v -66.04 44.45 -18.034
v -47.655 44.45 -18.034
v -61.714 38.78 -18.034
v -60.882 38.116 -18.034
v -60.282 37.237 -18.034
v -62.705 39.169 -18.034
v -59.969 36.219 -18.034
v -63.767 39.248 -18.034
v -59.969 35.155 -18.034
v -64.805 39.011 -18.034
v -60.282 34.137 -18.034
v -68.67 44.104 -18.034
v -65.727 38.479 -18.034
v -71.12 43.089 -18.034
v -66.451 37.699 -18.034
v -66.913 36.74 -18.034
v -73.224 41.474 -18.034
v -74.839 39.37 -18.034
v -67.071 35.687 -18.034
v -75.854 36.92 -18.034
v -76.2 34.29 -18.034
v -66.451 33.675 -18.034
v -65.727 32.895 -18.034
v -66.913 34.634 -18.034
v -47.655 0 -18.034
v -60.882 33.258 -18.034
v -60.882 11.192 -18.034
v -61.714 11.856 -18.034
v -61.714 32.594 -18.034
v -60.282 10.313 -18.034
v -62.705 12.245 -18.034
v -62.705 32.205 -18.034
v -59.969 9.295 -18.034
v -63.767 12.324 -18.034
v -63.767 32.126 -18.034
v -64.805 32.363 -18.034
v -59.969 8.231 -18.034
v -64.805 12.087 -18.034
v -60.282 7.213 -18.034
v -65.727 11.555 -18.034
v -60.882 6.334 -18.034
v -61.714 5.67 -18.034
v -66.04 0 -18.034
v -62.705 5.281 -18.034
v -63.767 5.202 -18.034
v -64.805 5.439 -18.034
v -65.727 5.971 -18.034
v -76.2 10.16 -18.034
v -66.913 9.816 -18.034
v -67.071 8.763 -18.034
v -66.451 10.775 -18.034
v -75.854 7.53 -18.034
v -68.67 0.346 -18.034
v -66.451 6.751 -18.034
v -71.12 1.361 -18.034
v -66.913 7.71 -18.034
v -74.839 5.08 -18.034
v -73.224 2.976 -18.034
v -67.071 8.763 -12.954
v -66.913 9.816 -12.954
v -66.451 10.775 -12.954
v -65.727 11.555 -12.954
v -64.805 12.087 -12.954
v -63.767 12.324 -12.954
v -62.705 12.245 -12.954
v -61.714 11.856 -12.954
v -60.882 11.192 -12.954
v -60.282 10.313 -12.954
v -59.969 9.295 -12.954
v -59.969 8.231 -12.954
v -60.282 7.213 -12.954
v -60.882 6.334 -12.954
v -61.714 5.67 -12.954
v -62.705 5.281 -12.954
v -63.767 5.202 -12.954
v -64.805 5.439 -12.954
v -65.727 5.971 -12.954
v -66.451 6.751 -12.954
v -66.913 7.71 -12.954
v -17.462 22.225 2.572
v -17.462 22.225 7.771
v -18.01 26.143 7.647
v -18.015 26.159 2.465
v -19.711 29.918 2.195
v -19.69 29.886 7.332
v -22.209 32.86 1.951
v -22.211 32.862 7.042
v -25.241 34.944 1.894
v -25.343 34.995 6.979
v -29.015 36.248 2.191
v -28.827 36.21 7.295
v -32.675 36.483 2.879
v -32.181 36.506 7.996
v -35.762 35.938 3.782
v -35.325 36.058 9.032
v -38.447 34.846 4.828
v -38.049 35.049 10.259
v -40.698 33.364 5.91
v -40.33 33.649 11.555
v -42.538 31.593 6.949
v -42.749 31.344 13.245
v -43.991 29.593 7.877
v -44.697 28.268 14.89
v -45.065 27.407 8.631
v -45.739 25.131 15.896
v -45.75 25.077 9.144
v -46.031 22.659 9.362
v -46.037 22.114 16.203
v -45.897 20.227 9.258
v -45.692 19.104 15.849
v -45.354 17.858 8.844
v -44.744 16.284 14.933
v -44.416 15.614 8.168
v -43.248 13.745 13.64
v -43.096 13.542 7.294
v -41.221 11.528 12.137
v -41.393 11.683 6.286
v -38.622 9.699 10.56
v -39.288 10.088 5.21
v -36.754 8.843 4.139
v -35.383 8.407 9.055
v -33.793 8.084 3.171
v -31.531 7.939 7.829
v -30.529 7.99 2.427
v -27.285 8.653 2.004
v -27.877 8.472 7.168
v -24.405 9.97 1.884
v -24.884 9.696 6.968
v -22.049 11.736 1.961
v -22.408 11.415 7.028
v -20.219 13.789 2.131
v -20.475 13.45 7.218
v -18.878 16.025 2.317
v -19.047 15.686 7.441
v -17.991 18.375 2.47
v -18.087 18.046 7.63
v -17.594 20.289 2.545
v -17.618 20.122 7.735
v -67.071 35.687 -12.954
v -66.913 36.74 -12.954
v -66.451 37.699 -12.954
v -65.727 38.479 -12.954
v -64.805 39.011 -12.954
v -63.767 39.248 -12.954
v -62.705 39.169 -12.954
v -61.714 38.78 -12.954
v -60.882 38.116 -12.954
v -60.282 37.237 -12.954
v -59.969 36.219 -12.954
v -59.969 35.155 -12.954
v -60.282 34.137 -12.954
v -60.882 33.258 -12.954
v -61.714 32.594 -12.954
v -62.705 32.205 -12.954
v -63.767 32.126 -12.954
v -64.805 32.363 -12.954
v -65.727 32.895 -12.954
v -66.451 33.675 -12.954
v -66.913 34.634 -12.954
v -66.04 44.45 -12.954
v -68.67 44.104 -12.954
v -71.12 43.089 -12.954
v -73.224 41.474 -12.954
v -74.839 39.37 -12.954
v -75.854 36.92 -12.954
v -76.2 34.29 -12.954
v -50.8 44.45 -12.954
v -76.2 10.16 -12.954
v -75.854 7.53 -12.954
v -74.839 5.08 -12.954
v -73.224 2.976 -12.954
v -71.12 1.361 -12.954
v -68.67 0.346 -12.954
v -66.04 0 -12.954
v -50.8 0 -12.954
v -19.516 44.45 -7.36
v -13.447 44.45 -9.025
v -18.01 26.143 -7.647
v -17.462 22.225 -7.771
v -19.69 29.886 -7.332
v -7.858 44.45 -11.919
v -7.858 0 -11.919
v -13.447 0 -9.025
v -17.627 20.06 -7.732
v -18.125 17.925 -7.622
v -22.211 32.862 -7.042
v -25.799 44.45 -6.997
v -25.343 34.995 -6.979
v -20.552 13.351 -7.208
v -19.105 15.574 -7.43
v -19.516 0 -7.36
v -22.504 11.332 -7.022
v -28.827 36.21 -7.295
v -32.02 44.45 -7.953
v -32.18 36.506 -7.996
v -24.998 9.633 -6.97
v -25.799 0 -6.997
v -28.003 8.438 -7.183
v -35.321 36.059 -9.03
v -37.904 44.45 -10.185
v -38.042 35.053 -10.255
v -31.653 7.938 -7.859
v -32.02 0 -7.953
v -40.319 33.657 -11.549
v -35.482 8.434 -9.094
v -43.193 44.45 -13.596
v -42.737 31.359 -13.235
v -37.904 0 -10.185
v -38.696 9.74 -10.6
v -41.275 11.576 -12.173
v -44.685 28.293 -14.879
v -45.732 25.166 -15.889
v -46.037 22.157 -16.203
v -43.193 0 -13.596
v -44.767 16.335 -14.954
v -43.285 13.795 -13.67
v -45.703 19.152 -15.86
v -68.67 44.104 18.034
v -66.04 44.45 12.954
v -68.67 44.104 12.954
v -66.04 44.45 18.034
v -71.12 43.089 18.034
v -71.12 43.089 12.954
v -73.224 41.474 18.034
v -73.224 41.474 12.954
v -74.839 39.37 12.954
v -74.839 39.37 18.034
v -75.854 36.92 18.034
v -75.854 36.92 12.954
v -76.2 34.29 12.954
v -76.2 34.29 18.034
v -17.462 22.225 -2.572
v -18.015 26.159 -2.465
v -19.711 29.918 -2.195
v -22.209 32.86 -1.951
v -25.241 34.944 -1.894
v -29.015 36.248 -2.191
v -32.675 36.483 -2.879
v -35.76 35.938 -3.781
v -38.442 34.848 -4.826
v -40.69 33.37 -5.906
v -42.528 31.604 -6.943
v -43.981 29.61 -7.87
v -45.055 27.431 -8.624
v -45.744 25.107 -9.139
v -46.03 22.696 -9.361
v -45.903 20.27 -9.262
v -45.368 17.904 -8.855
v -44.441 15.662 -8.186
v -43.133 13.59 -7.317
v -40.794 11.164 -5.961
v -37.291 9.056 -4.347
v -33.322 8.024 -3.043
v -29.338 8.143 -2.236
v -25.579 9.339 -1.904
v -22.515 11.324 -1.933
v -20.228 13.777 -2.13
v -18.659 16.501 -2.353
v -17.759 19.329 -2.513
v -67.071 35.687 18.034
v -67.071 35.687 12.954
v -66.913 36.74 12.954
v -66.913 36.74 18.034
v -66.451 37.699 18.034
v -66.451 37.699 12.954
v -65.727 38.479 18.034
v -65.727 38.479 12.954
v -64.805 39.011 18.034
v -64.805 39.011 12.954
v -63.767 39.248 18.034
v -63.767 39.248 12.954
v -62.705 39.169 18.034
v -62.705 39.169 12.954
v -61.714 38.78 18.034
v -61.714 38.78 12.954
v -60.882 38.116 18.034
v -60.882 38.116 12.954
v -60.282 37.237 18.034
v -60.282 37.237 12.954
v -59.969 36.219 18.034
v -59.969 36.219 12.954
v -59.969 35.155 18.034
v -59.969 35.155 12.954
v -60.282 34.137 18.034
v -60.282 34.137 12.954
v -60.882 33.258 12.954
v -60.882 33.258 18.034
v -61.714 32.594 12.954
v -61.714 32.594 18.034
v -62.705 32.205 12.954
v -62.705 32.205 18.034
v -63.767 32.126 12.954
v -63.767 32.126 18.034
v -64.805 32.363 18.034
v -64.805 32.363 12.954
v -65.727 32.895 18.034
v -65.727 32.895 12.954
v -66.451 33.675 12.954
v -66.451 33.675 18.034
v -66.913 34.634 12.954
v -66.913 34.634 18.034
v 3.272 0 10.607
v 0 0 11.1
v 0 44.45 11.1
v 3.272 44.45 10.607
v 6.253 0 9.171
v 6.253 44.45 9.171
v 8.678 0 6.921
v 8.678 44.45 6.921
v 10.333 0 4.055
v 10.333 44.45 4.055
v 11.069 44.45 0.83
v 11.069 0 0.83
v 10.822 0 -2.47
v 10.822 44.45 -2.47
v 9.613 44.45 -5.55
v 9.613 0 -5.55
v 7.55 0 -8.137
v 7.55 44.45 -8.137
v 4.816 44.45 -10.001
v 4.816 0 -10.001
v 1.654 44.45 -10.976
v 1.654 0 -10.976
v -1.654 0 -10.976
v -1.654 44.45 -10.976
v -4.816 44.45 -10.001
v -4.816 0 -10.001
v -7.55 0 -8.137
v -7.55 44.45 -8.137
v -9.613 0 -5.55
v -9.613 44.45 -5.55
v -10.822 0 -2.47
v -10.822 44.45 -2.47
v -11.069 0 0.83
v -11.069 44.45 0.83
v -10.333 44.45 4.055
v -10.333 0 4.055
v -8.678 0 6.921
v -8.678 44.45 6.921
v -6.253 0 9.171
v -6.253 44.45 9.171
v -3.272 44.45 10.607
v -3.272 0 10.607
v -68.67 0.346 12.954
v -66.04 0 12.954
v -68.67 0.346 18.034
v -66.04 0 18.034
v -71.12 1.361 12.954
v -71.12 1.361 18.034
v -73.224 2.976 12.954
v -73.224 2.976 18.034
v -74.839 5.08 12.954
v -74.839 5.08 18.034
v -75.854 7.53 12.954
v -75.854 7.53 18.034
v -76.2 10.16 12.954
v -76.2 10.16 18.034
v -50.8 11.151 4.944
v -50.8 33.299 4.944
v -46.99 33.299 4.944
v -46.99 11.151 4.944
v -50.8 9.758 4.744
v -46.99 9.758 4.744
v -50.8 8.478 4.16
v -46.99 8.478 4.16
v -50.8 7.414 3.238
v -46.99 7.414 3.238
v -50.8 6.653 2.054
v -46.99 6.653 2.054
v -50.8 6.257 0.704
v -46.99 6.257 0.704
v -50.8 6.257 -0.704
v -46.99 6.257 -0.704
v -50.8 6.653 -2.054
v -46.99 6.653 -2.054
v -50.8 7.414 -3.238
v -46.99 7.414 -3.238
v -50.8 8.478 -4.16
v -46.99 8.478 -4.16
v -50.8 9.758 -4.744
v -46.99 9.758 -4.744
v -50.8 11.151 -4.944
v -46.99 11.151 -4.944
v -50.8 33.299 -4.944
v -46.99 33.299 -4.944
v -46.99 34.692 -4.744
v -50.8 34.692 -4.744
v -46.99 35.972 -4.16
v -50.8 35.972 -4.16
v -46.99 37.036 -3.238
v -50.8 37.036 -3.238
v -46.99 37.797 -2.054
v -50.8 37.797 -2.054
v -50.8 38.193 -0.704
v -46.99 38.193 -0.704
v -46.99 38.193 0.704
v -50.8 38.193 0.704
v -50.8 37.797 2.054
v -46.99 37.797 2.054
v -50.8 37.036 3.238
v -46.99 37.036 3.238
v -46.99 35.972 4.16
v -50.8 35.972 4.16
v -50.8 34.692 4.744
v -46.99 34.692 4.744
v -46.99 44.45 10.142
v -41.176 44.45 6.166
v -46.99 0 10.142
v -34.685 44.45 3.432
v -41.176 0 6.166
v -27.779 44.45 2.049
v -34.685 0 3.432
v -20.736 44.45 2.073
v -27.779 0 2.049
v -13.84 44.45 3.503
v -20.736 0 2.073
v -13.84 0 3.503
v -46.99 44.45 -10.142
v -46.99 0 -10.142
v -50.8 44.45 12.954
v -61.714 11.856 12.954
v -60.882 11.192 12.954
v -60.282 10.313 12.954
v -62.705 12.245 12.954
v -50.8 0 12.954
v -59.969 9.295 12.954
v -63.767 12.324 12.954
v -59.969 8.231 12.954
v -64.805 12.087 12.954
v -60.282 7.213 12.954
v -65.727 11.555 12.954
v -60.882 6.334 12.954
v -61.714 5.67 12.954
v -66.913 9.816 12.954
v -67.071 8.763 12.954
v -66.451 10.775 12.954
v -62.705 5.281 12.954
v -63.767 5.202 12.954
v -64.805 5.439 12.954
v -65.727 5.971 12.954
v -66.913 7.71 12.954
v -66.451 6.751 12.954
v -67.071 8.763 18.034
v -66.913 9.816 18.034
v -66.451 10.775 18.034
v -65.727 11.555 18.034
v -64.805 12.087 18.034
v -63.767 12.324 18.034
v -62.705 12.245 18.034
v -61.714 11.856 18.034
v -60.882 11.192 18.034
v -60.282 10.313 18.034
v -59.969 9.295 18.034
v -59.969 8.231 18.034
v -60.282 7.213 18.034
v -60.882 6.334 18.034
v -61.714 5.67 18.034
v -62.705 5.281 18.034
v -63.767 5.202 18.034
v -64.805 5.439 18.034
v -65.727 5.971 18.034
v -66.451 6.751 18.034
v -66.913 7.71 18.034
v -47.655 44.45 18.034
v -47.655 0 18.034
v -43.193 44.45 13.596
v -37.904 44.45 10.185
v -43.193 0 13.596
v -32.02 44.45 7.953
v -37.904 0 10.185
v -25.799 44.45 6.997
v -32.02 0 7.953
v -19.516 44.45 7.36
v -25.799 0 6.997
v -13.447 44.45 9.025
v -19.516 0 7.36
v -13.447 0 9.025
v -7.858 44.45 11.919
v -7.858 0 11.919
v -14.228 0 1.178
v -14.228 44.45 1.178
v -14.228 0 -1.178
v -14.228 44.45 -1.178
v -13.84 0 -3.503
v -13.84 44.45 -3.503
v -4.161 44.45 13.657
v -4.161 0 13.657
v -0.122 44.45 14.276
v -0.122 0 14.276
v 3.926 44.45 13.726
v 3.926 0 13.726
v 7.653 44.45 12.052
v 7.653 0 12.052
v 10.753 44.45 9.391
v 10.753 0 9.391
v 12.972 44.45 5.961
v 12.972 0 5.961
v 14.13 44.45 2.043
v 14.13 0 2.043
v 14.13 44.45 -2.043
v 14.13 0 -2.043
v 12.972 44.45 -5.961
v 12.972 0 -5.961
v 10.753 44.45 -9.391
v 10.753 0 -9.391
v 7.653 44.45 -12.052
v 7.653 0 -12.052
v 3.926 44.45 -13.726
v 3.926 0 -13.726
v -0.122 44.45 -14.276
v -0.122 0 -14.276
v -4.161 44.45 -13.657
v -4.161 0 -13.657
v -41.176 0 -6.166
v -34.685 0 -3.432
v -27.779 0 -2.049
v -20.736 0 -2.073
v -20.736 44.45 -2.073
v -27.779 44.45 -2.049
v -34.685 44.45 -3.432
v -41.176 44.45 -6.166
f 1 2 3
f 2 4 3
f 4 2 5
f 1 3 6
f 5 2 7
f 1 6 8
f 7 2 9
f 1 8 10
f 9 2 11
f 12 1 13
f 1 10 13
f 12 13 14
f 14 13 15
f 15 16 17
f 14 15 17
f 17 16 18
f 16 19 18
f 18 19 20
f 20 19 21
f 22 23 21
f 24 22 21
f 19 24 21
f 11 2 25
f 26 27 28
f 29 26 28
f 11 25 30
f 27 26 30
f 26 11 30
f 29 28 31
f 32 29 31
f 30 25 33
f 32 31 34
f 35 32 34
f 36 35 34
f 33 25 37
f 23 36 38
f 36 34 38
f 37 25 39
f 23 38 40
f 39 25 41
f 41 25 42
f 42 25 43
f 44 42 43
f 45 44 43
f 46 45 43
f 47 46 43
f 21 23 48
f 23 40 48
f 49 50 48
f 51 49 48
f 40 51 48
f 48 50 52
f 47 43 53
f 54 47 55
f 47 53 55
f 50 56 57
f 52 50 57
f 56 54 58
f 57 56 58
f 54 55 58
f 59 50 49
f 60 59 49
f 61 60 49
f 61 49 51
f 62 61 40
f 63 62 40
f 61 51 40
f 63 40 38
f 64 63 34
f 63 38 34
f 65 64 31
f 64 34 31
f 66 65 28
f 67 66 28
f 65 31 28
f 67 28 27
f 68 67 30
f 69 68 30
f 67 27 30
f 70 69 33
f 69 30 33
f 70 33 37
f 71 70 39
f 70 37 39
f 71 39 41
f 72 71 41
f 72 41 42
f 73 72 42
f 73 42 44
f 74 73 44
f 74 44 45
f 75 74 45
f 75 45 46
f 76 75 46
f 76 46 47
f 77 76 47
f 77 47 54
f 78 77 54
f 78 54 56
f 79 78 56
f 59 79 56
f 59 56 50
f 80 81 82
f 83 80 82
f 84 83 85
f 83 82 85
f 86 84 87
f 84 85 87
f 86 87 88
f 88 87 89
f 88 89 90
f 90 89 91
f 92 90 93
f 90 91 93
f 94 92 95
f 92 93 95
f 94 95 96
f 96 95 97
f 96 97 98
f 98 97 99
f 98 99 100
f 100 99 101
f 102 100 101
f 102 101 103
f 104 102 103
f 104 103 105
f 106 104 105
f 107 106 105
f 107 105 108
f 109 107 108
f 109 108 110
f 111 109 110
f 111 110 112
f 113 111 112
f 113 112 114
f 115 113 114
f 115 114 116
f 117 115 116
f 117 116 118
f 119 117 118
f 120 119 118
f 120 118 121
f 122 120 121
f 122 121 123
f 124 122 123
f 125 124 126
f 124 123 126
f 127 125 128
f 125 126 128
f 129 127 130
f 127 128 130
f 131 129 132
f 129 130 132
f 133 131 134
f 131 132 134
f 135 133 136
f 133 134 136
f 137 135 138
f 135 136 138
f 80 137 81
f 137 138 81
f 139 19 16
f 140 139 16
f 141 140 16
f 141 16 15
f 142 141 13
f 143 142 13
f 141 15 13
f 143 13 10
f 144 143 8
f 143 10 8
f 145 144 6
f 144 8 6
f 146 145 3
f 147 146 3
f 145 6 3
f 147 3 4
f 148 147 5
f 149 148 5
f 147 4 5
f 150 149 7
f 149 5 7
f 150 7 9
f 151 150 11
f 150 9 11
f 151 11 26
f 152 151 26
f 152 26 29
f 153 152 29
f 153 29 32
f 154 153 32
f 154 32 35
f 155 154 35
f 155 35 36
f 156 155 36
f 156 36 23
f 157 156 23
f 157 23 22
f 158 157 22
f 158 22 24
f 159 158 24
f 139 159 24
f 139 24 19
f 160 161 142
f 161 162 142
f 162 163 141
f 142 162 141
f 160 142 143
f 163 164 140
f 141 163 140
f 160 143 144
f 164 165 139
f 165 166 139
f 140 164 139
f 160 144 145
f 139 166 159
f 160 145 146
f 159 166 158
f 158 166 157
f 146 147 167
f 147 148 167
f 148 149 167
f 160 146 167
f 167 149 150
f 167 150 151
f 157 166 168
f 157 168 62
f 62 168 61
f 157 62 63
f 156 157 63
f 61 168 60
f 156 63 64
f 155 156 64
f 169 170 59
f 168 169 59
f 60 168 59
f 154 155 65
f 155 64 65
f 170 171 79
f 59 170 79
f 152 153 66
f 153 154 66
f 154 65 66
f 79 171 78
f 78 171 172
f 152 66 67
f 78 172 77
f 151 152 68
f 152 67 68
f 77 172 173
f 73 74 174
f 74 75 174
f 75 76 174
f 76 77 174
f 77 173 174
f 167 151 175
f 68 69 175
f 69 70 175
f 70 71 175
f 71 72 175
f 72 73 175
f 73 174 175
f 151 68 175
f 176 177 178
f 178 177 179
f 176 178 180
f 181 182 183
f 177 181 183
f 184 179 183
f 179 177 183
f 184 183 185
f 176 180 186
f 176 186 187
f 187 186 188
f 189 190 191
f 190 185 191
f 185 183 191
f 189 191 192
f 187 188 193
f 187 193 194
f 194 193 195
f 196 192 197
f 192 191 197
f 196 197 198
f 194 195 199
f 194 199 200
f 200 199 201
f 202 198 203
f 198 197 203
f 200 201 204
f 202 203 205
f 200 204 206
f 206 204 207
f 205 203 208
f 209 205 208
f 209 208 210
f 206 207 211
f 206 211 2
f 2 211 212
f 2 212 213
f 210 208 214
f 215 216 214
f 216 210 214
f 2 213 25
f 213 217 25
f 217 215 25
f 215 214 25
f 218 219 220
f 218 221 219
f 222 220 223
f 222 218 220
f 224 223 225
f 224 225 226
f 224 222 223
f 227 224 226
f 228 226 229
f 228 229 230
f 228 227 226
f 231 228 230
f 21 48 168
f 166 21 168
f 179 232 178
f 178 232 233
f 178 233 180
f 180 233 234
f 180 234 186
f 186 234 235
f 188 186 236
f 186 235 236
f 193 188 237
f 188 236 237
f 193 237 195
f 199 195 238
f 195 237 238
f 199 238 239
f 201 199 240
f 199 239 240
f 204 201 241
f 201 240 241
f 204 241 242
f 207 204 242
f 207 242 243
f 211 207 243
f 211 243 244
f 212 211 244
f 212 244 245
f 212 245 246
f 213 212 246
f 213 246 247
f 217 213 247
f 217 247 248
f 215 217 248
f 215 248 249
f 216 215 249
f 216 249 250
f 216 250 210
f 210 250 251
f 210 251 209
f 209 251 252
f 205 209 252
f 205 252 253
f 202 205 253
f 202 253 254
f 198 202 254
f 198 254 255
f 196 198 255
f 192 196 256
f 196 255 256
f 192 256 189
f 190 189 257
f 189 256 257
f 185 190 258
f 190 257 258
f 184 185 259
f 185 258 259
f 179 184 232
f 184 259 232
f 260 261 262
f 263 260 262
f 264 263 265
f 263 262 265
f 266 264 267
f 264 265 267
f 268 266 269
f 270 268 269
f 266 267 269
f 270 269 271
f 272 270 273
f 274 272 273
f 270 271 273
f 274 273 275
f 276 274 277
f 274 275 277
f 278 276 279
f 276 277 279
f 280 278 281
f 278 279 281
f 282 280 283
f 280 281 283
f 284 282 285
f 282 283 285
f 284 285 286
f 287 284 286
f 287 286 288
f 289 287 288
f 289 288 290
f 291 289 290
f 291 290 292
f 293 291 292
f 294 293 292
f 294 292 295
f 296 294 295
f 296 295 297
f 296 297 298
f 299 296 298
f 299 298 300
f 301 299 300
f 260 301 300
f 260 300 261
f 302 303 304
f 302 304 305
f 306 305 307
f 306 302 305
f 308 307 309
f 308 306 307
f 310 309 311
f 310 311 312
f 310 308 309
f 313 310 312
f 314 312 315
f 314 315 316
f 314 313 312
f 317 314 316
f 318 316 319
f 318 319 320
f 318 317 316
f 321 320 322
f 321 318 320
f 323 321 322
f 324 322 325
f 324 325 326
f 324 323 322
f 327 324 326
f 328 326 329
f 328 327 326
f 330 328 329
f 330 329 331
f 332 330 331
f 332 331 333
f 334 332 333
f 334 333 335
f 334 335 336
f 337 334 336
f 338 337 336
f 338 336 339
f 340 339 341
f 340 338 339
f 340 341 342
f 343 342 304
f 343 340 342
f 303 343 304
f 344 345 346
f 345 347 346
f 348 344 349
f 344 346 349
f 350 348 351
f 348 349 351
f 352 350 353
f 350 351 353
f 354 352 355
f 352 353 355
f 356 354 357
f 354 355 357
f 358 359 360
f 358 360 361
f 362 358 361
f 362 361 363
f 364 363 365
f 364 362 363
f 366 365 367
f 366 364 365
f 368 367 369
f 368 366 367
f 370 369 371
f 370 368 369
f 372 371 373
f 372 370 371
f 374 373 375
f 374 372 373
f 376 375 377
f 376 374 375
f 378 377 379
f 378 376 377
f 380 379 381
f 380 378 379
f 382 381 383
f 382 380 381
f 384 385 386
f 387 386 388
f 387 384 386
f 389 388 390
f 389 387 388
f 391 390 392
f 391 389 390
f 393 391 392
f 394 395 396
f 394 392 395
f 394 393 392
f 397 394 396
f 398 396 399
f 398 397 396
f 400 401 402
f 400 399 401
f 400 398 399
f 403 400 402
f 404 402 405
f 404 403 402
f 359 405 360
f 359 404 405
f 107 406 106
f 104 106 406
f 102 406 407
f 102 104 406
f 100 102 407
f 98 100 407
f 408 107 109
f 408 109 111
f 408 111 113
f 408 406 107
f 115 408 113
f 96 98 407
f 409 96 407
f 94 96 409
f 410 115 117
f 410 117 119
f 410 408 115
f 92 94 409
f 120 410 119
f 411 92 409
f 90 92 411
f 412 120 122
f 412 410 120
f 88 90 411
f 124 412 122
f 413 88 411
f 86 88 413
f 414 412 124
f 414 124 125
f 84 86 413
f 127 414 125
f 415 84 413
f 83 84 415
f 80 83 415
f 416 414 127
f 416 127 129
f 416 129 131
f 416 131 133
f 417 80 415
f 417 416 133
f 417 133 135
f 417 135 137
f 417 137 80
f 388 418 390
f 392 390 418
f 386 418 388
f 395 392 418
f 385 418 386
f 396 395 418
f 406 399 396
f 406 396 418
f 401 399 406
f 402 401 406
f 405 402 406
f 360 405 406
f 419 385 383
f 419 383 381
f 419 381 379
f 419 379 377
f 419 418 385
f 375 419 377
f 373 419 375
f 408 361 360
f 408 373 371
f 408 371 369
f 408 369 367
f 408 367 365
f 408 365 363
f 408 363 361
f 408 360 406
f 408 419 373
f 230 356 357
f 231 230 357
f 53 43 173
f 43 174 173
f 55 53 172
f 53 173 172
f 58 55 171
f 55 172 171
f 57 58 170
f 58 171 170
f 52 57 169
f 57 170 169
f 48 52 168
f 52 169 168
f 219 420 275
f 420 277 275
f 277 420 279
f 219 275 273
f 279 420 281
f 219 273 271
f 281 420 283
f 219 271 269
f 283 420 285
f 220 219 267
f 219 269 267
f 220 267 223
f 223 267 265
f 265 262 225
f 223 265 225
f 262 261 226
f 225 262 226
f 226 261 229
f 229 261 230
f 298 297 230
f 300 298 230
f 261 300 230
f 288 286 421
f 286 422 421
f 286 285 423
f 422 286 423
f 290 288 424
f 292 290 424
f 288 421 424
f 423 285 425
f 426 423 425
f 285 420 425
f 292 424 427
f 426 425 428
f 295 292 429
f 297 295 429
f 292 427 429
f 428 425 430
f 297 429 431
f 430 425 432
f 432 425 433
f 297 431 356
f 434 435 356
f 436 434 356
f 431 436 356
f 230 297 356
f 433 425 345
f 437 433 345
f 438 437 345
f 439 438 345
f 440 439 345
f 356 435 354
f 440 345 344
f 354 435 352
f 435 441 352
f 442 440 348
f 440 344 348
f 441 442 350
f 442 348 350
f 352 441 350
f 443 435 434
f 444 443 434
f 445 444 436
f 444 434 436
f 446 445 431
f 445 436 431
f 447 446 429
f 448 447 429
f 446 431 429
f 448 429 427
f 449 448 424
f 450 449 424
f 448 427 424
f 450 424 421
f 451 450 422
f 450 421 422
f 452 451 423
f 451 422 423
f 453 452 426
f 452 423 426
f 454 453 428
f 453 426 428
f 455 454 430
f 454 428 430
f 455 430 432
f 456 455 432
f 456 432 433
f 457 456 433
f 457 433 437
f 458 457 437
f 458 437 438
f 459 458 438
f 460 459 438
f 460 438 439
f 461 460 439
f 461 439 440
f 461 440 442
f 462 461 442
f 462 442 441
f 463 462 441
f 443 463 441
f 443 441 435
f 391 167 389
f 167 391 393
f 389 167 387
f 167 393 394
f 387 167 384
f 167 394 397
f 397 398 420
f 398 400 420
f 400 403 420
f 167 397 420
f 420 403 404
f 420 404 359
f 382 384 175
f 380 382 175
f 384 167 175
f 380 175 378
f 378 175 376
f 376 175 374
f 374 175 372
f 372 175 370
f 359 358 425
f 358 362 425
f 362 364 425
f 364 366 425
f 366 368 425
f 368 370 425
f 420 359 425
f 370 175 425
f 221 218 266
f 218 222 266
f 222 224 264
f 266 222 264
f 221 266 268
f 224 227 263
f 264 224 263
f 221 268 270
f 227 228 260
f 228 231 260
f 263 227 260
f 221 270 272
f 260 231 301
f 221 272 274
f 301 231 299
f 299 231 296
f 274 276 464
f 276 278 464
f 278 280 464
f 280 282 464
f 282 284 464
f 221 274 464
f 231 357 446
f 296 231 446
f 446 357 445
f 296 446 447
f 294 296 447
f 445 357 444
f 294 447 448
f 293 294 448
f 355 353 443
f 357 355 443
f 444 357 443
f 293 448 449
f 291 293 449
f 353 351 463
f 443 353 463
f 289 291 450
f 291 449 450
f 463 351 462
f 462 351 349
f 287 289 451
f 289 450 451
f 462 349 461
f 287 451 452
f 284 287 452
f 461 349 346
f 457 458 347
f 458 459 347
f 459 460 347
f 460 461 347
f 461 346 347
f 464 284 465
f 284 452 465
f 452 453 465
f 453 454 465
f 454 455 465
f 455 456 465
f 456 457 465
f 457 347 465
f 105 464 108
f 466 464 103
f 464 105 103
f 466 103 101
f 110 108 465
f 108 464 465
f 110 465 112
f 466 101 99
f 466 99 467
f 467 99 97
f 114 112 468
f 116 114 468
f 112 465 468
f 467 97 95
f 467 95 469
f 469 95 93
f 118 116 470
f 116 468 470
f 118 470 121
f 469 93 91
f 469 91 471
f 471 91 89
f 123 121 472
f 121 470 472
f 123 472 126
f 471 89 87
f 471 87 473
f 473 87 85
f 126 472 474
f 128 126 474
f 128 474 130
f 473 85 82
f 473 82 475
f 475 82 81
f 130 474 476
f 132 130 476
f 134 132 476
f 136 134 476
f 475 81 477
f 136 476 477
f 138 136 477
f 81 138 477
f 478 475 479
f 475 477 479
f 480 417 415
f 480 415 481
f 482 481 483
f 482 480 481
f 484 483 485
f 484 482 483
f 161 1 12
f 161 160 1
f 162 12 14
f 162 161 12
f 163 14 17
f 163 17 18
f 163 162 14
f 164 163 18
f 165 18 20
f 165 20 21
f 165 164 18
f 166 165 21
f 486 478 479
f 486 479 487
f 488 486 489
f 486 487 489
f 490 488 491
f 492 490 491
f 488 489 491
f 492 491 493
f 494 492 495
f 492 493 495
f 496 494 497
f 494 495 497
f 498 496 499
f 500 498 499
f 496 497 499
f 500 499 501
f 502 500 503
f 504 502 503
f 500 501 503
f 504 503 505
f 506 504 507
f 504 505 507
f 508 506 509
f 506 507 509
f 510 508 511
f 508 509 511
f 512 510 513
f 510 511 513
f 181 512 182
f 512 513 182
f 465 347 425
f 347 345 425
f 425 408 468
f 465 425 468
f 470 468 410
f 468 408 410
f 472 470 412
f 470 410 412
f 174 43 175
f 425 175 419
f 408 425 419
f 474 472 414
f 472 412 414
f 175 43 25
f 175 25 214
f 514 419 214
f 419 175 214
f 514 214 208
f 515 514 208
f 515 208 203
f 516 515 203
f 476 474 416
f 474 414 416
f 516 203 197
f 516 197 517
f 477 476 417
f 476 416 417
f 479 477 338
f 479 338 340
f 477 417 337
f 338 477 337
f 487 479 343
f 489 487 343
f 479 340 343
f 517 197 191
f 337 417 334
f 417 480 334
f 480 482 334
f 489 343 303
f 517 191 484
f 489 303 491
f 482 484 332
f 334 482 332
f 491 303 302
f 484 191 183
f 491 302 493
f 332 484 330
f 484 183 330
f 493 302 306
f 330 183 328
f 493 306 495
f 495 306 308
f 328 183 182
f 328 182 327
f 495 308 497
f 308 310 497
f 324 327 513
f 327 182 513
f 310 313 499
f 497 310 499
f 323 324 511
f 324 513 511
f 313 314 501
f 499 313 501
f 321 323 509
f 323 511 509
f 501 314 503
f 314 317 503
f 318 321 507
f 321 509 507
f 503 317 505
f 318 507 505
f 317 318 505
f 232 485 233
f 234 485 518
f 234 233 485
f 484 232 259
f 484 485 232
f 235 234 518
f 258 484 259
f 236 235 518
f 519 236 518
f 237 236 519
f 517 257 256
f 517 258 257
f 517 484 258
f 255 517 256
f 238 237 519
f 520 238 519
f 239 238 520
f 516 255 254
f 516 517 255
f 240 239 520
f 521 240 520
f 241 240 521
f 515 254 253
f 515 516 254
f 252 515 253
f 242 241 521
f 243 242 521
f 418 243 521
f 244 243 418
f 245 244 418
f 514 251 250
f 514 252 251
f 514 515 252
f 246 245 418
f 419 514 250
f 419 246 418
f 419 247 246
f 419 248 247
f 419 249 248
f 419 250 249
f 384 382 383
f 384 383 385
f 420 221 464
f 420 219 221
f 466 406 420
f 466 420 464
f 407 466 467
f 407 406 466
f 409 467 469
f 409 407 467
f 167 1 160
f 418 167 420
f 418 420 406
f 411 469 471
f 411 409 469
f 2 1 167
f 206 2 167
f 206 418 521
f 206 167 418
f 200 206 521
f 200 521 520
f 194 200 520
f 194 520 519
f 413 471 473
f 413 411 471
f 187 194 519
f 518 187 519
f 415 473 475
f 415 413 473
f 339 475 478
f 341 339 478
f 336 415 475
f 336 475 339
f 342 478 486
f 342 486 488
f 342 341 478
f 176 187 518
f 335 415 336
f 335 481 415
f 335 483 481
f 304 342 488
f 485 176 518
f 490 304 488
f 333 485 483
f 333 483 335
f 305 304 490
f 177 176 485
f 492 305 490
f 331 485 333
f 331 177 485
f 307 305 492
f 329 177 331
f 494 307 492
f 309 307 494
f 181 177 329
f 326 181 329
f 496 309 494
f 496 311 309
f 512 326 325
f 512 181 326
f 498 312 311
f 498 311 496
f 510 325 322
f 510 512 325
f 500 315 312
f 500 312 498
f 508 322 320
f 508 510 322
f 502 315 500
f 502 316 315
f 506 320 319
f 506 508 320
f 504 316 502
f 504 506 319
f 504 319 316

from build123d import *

# Parameters (mm, degrees)
SKETCH1_R               = 11.1
BOSS_EXTRUDE1_DEPTH     = 44.45
CUT_EXTRUDE1_REACH      = 82.845
SKETCH3_R               = 14.2875
CUT_EXTRUDE2_DEPTH      = 50.8
F_1_4_CLEARANCE_HOLE1_D = 7.14248
FILLET5_R               = 10.16


with BuildPart() as part:
    # Sketch1 → Boss-Extrude1 (new body)
    with BuildSketch(Plane(origin=(0, 0, 0), x_dir=(1, 0, 0), z_dir=(0, 1, 0))):
        with BuildLine():
            Line((-76.2, 12.954), (-50.8, 12.954))
            Line((-50.8, 12.954), (-50.8, -12.954))
            Line((-50.8, -12.954), (-76.2, -12.954))
            Line((-76.2, -12.954), (-76.2, -18.034))
            Line((-76.2, -18.034), (-50.8, -18.034))
            Line((-50.8, -18.034), (-47.655215915, -18.034))
            ThreePointArc((-47.655215915, -18.034), (-28.934565222, -7.31168908), (-7.858432995, -11.919005456))
            ThreePointArc((-7.858432995, -11.919005456), (14.27647226, 0), (-7.858432995, 11.919005456))
            ThreePointArc((-7.858432995, 11.919005456), (-28.934565222, 7.31168908), (-47.655215915, 18.034))
            Line((-47.655215915, 18.034), (-50.8, 18.034))
            Line((-50.8, 18.034), (-50.907646935, 18.034))
            Line((-50.907646935, 18.034), (-76.2, 18.034))
            Line((-76.2, 18.034), (-76.2, 12.954))
        make_face()
        with BuildLine():
            Line((-46.99, -10.141749752), (-46.99, 10.141749752))
            ThreePointArc((-46.99, 10.141749752), (-31.26726895, 2.566739092), (-13.840035745, 3.503008817))
            ThreePointArc((-13.840035745, 3.503008817), (-14.27647226, 0), (-13.840035745, -3.503008817))
            ThreePointArc((-13.840035745, -3.503008817), (-31.26726895, -2.566739092), (-46.99, -10.141749752))
        make_face(mode=Mode.SUBTRACT)
        Circle(SKETCH1_R, mode=Mode.SUBTRACT)
    extrude(amount=BOSS_EXTRUDE1_DEPTH)

    # Sketch2 → Cut-Extrude1 (cut, up to next)
    with BuildSketch(Plane.ZY.offset(50.8), mode=Mode.PRIVATE) as cut_extrude1_sk1:
        with BuildLine():
            Line((4.944497397, 33.298849711), (4.944497397, 11.151150289))
            ThreePointArc((4.944497397, 11.151150289), (0, 6.206652892), (-4.944497397, 11.151150289))
            Line((-4.944497397, 11.151150289), (-4.944497397, 33.298849711))
            ThreePointArc((-4.944497397, 33.298849711), (0, 38.243347108), (4.944497397, 33.298849711))
        make_face()
    cut_extrude1_tool1 = extrude(cut_extrude1_sk1.sketch, amount=-CUT_EXTRUDE1_REACH, mode=Mode.PRIVATE) & part.part
    add(cut_extrude1_tool1.solids().sort_by_distance((-50.8, 22.225, 0))[0], mode=Mode.SUBTRACT)

    # Sketch3 → Cut-Extrude2 (cut)
    with BuildSketch(Plane.XY.offset(18.034)):
        with Locations((-31.75, 22.225)):
            Circle(SKETCH3_R)
    extrude(amount=-CUT_EXTRUDE2_DEPTH, mode=Mode.SUBTRACT)

    # 1/4 Clearance Hole1 (through all)
    with Locations(Plane.XY.offset(18.034)):
        with Locations((-63.5, 35.687), (-63.5, 8.763)):
            Hole(F_1_4_CLEARANCE_HOLE1_D / 2)

    # Fillet5
    fillet5_edges = [part.edges().sort_by_distance(p)[0] for p in [
        (-76.2, 0, -15.494),
        (-76.2, 0, 15.494),
        (-76.2, 44.45, -15.494),
        (-76.2, 44.45, 15.494),
    ]]
    fillet(fillet5_edges, radius=FILLET5_R)


solid = part.part
